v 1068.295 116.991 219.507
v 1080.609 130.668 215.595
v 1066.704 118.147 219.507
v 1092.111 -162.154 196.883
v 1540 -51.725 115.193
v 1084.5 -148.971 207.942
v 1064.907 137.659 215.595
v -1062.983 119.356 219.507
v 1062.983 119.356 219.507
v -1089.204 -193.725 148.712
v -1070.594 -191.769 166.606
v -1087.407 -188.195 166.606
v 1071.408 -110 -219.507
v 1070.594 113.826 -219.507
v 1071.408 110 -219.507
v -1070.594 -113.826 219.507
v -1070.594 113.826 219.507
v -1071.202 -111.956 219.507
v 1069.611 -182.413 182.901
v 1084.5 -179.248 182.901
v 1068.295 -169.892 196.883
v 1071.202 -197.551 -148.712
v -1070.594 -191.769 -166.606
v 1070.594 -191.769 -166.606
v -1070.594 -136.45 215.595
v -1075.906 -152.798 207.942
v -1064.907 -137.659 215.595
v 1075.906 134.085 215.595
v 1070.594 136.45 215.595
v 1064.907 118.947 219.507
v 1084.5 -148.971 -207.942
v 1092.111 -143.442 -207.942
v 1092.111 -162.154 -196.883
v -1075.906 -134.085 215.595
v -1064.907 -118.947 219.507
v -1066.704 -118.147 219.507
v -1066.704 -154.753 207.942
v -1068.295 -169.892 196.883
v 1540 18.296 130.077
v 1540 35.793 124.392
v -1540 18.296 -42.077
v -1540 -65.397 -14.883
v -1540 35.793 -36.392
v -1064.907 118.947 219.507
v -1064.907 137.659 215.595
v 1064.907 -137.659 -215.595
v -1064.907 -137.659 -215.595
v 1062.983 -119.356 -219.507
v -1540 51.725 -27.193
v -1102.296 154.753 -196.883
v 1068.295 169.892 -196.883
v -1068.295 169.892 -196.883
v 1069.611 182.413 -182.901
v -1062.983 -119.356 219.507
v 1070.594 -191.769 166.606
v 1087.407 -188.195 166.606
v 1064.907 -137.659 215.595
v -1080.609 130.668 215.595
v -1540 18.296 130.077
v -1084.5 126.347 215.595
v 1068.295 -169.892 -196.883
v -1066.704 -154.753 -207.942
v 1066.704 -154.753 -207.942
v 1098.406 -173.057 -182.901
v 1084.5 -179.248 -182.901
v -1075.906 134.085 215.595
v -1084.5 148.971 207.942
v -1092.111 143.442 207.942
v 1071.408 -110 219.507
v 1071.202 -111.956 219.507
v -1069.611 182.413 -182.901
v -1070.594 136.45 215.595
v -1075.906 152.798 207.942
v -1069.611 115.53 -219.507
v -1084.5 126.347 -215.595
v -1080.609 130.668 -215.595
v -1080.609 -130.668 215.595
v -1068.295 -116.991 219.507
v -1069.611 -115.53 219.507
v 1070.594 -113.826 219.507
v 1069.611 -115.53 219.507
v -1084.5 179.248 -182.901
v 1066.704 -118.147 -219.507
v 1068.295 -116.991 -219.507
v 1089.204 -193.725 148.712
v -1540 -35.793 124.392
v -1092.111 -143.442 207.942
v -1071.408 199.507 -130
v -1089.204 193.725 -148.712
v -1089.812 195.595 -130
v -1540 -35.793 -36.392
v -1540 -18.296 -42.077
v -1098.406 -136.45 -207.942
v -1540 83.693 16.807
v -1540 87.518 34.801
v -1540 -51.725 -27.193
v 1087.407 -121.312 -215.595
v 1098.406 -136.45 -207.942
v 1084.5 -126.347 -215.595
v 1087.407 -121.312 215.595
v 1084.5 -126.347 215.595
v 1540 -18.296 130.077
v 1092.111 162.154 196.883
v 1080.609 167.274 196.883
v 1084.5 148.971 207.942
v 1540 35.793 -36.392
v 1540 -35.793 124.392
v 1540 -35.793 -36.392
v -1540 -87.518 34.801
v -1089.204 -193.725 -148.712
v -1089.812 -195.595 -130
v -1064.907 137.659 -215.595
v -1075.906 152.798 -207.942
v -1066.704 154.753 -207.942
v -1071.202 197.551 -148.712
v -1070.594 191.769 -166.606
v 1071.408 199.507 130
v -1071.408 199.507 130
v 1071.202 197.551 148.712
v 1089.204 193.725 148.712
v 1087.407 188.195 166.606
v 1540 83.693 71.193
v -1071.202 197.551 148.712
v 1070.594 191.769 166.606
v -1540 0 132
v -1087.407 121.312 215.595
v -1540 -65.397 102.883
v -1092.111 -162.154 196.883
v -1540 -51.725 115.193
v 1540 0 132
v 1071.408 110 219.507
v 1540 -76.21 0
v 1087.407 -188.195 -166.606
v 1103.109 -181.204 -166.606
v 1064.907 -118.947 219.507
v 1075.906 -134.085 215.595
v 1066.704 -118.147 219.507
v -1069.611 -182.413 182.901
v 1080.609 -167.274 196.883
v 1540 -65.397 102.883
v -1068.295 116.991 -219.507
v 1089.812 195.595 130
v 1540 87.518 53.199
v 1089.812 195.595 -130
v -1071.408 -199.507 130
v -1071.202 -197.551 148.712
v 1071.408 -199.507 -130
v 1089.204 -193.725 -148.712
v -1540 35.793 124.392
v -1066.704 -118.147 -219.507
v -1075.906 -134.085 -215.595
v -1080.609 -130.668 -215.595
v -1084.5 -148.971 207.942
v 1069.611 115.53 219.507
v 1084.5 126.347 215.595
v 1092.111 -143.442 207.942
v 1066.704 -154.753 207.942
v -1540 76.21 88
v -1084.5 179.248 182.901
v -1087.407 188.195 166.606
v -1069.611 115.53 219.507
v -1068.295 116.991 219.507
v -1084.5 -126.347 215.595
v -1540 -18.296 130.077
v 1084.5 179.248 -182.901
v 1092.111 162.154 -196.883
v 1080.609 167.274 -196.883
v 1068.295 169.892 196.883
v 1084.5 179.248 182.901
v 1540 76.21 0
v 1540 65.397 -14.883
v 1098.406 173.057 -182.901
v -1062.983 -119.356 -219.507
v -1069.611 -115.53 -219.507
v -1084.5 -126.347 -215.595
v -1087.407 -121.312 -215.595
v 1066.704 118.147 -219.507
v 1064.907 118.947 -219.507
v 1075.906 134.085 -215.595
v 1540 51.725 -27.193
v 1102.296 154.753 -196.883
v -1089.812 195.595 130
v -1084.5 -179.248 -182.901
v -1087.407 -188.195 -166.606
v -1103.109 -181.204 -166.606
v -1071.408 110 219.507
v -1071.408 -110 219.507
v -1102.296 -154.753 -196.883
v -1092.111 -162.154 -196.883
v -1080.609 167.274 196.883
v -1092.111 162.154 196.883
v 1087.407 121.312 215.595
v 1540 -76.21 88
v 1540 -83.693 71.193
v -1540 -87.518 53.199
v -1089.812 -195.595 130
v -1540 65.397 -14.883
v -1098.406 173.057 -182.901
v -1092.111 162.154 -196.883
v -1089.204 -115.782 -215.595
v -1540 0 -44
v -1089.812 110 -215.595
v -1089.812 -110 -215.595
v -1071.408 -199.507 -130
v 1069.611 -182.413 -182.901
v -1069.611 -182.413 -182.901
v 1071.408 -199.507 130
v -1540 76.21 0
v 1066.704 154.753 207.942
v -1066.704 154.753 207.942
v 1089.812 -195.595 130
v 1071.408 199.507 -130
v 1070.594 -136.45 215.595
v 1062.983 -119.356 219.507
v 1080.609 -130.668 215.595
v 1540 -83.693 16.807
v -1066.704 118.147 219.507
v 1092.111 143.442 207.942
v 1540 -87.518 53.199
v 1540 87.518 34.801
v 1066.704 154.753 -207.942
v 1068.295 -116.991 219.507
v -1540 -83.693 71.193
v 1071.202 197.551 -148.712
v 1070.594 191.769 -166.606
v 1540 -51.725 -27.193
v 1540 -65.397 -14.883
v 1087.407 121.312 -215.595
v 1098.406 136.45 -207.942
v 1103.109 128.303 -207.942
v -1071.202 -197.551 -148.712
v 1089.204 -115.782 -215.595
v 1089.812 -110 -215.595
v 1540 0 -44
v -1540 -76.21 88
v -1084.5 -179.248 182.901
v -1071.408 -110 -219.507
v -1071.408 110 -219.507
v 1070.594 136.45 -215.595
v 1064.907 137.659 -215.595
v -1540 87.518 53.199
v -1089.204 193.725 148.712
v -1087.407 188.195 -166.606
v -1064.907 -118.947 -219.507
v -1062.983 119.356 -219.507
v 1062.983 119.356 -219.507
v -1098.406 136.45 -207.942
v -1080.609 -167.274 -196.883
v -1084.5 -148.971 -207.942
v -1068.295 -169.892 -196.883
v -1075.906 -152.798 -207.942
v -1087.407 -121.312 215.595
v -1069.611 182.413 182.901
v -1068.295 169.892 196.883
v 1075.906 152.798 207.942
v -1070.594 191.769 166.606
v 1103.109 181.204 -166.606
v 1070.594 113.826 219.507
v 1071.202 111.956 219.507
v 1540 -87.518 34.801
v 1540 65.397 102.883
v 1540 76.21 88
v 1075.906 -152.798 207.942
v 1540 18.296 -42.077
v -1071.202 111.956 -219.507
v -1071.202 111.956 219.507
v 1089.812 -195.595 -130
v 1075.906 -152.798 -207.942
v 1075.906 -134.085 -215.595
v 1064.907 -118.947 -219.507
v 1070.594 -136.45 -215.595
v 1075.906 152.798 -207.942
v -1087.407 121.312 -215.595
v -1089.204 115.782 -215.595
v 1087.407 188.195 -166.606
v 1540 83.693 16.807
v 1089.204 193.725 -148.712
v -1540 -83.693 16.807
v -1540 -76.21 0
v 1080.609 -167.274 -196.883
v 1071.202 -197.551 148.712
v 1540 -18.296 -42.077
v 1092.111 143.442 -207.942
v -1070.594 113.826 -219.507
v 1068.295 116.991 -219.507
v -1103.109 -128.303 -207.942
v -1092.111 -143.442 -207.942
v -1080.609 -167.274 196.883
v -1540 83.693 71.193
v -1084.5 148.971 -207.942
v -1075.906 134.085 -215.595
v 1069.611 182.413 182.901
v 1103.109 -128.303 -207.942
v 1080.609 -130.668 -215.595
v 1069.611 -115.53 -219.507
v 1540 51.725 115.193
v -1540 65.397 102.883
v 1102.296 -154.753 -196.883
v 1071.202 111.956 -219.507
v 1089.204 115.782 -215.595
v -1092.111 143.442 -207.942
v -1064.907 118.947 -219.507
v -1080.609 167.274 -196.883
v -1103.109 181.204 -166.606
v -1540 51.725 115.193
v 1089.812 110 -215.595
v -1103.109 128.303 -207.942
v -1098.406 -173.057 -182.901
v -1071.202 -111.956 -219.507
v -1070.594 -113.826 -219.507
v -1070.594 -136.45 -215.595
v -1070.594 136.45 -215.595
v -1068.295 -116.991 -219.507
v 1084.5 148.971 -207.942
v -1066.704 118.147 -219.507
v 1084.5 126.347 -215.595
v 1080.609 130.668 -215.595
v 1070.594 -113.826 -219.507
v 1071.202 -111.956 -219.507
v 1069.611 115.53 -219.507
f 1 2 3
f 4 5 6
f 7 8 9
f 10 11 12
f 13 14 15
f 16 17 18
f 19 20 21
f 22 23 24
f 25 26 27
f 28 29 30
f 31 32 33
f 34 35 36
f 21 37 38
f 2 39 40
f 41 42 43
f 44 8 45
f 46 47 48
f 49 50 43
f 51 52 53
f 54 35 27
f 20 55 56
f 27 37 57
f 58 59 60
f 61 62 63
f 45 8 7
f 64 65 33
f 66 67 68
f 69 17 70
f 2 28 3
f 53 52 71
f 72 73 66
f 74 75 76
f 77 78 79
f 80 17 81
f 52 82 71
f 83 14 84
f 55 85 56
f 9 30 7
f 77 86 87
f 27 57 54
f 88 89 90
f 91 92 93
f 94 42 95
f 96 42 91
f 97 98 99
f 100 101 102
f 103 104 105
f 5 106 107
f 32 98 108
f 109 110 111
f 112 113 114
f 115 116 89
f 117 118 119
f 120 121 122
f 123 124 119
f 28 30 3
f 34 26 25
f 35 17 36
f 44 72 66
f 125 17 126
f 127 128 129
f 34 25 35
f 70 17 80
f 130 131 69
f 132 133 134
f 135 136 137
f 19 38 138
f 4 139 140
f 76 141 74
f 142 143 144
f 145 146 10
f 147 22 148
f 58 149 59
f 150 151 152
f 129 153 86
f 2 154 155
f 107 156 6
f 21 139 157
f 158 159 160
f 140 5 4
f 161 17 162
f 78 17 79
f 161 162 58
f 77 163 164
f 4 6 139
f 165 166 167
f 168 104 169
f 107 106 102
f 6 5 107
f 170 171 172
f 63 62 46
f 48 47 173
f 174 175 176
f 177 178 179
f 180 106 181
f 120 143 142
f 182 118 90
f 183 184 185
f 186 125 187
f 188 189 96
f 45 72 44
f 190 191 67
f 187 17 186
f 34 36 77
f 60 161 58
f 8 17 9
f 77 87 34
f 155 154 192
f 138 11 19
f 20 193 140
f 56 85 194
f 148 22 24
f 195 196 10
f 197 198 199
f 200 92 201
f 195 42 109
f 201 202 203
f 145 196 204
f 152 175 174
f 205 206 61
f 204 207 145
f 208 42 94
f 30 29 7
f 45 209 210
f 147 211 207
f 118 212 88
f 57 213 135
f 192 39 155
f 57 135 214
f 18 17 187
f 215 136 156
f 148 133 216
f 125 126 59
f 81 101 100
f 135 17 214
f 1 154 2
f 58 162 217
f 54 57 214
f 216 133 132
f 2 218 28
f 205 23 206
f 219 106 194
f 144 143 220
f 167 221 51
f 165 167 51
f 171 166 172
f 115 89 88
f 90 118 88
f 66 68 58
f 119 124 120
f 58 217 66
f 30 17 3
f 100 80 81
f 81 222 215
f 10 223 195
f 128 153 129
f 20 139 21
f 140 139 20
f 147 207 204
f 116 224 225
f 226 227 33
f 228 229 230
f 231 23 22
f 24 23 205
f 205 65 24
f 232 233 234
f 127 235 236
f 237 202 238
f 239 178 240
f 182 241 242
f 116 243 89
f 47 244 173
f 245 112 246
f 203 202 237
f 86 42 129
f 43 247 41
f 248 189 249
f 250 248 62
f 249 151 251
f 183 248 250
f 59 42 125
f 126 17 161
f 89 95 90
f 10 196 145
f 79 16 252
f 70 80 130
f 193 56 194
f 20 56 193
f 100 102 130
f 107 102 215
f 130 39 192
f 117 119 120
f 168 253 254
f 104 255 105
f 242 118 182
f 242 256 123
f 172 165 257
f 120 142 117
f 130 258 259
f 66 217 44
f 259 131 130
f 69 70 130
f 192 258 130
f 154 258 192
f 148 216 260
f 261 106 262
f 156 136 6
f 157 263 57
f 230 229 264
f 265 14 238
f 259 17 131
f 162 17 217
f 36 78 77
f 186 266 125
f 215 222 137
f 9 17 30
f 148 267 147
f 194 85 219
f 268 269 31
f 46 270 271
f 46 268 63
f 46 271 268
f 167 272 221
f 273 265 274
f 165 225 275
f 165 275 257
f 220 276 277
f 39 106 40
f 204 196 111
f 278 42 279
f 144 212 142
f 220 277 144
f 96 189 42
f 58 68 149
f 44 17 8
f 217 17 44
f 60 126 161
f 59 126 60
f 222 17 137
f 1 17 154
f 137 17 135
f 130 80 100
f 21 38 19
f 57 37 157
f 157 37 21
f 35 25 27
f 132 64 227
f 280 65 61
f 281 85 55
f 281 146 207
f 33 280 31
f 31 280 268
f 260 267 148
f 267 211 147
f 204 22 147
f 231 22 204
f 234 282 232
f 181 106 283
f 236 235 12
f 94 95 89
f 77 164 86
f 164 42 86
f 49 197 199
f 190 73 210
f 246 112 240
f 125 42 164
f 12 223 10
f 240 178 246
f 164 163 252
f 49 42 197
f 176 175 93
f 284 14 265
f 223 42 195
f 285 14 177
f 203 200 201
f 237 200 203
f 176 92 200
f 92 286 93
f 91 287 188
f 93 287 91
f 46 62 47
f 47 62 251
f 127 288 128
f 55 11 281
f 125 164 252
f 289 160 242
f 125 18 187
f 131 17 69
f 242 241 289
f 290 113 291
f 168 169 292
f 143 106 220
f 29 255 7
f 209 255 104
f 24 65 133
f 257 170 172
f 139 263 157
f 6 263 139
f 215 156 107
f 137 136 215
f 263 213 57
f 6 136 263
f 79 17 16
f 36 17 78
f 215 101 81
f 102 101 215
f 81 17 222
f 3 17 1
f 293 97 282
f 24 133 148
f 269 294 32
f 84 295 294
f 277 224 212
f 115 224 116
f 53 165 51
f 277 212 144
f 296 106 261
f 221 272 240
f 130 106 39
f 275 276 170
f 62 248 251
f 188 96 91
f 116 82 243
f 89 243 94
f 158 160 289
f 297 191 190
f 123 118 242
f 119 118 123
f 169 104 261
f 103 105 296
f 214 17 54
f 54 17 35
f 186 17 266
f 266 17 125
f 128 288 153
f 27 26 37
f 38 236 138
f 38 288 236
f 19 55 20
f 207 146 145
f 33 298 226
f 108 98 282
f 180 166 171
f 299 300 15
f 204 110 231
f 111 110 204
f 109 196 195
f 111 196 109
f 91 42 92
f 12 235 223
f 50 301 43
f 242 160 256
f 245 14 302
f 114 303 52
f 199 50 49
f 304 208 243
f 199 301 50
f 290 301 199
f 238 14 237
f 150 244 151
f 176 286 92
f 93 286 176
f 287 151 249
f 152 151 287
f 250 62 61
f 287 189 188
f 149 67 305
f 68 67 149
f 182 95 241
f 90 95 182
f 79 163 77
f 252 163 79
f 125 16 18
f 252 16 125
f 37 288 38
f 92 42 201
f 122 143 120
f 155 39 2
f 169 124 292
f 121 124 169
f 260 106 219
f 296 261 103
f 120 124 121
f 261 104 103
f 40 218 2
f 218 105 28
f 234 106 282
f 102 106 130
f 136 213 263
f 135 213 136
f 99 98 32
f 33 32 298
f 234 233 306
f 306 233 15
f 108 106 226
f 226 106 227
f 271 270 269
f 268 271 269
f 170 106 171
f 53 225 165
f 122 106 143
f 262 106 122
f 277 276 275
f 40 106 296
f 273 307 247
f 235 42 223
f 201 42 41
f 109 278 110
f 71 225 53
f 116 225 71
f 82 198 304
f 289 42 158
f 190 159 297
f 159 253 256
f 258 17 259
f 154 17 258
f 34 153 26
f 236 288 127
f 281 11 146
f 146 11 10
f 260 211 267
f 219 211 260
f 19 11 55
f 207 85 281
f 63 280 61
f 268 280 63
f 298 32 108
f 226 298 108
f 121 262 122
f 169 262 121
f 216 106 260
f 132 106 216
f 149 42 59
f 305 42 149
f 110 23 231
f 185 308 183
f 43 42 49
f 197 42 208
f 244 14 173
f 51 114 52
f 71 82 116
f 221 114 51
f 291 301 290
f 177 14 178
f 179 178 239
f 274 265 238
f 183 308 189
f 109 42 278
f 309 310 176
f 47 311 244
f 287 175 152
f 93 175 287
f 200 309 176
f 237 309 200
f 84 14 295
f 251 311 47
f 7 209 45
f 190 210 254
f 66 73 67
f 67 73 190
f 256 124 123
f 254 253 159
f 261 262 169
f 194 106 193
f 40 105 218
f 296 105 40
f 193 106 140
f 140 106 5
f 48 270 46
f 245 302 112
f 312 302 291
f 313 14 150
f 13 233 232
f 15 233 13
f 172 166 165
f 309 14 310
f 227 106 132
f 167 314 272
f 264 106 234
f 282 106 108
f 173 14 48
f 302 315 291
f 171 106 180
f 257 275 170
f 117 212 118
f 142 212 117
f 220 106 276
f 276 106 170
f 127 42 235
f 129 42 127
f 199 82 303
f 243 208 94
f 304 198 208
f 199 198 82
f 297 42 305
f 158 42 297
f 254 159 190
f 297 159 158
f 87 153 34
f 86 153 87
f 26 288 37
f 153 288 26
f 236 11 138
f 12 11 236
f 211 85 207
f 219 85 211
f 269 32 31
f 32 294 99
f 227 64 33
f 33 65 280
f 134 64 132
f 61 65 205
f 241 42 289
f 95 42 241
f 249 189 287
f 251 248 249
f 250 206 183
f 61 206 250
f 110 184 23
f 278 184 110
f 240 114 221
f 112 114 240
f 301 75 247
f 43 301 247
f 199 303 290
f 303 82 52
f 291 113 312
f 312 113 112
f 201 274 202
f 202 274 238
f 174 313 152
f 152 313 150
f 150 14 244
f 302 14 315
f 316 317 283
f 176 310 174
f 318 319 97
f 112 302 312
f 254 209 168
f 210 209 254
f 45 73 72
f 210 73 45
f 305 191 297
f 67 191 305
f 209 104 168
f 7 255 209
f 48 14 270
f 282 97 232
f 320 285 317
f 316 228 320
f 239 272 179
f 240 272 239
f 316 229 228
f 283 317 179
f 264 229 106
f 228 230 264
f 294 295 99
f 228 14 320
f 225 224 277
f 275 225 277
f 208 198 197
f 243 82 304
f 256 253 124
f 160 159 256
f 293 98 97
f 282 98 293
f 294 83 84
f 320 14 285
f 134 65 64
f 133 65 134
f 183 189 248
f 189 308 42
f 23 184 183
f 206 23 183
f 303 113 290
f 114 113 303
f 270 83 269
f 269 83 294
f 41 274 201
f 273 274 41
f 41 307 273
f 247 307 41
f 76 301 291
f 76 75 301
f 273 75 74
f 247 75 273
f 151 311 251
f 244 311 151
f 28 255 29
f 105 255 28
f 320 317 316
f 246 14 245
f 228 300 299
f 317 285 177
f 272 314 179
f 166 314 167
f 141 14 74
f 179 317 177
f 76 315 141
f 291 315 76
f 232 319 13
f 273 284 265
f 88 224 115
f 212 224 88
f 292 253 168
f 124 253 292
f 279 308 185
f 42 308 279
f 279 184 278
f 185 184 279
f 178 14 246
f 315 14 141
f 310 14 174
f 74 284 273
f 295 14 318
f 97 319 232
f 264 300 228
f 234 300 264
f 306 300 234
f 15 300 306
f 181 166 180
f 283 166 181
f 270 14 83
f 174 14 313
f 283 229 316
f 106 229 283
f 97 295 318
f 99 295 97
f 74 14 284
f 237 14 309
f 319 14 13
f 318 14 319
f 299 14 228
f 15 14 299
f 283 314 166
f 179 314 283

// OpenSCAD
// file: ../lib/shapes.scad
// shapes.scad — small geometry helpers

// box with rounded corners, centered
module rounded_box(size, r = 40) {
  hull()
    for (x = [-size[0]/2 + r, size[0]/2 - r],
         y = [-size[1]/2 + r, size[1]/2 - r],
         z = [-size[2]/2 + r, size[2]/2 - r])
      translate([x, y, z]) sphere(r = r);
}

// rod between two points
module rod(p1, p2, d) {
  hull() {
    translate(p1) sphere(d = d);
    translate(p2) sphere(d = d);
  }
}

// symmetric NACA-4-digit-ish foil section, chord along +x, LE at origin
function naca_half(c, t, n) =
  [ for (i = [0 : n])
      let (u = i / n,
           yt = 5 * t * c * (0.2969 * sqrt(u) - 0.1260 * u
                - 0.3516 * u * u + 0.2843 * u * u * u
                - 0.1015 * u * u * u * u))
      [u * c, yt] ];

function foil_pts(c, t = 0.12, n = 24) =
  concat(naca_half(c, t, n),
         [ for (i = [n - 1 : -1 : 1])
             let (p = naca_half(c, t, n)[i]) [p[0], -p[1]] ]);
// main file
// ama.scad — foam-cored float, long axis along x, centered at origin
include <../params.scad>
use <../lib/shapes.scad>

module ama() {
  color("darkorange")
    hull() {
      rounded_box([ama_len * 0.72, ama_w, ama_h], r = 90);
      // tapered bow/stern tips
      for (s = [-1, 1])
        translate([s * (ama_len / 2 - 80), 0, ama_h * 0.1])
          rotate([0, 90, 0])
            cylinder(h = 40, d = ama_h * 0.4, center = true);
    }
}

ama();   // demo
